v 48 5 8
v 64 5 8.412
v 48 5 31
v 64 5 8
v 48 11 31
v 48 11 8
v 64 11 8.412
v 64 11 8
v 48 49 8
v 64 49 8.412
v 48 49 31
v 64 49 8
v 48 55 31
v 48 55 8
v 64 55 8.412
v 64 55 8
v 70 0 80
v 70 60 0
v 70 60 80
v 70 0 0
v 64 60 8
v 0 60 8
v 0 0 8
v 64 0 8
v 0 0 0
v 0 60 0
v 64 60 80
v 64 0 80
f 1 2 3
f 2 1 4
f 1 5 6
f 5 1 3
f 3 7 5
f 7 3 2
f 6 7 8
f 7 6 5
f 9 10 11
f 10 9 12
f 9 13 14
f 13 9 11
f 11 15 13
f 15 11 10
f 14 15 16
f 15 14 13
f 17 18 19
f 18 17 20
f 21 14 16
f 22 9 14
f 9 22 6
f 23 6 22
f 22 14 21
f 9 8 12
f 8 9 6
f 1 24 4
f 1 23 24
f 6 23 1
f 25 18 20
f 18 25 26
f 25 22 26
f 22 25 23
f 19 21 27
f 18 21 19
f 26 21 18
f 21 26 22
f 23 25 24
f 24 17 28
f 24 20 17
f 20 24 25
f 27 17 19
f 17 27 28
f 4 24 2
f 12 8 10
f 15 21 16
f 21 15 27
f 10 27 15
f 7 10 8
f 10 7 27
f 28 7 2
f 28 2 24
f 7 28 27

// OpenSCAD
$fn = 32;

// ----------------------------------------------------------------------
// Rib bracket: 2-gusset L bracket
// ----------------------------------------------------------------------

// --- parameters (mm) ---
base_l = 70;              // foot length, X
base_w = 60;              // foot width, Y
base_t = 8;               // foot thickness
plate_t = 6;              // upright plate thickness
plate_h = 80;             // overall height
gus_l = 16;               // gusset leg along the foot
gus_h = 24;               // gusset height
gus_t = 6;                // gusset thickness
gus_edge = 5;             // gusset margin from the foot edge
n_gus = 2;                // gusset count
fit_tol = 0.1;            // tolerance for press fits, mm
free_tol = 0.5;           // tolerance for clearance fits, mm

gus_pitch = (base_w - 2 * gus_edge - gus_t) / (n_gus - 1);  // gusset pitch

union() {
  cube([base_l, base_w, base_t]);
  translate([base_l - plate_t, 0, base_t - 1])
    cube([plate_t, base_w, plate_h - base_t + 1]);
  for (i = [0 : n_gus - 1])
    translate([base_l - plate_t - gus_l, gus_edge + i * gus_pitch, base_t - 1])
      rotate([-90, 0, 0])
        linear_extrude(height = gus_t)
          polygon(points = [[0, 0], [gus_l + 1, 0], [0, -gus_h]]);
}
